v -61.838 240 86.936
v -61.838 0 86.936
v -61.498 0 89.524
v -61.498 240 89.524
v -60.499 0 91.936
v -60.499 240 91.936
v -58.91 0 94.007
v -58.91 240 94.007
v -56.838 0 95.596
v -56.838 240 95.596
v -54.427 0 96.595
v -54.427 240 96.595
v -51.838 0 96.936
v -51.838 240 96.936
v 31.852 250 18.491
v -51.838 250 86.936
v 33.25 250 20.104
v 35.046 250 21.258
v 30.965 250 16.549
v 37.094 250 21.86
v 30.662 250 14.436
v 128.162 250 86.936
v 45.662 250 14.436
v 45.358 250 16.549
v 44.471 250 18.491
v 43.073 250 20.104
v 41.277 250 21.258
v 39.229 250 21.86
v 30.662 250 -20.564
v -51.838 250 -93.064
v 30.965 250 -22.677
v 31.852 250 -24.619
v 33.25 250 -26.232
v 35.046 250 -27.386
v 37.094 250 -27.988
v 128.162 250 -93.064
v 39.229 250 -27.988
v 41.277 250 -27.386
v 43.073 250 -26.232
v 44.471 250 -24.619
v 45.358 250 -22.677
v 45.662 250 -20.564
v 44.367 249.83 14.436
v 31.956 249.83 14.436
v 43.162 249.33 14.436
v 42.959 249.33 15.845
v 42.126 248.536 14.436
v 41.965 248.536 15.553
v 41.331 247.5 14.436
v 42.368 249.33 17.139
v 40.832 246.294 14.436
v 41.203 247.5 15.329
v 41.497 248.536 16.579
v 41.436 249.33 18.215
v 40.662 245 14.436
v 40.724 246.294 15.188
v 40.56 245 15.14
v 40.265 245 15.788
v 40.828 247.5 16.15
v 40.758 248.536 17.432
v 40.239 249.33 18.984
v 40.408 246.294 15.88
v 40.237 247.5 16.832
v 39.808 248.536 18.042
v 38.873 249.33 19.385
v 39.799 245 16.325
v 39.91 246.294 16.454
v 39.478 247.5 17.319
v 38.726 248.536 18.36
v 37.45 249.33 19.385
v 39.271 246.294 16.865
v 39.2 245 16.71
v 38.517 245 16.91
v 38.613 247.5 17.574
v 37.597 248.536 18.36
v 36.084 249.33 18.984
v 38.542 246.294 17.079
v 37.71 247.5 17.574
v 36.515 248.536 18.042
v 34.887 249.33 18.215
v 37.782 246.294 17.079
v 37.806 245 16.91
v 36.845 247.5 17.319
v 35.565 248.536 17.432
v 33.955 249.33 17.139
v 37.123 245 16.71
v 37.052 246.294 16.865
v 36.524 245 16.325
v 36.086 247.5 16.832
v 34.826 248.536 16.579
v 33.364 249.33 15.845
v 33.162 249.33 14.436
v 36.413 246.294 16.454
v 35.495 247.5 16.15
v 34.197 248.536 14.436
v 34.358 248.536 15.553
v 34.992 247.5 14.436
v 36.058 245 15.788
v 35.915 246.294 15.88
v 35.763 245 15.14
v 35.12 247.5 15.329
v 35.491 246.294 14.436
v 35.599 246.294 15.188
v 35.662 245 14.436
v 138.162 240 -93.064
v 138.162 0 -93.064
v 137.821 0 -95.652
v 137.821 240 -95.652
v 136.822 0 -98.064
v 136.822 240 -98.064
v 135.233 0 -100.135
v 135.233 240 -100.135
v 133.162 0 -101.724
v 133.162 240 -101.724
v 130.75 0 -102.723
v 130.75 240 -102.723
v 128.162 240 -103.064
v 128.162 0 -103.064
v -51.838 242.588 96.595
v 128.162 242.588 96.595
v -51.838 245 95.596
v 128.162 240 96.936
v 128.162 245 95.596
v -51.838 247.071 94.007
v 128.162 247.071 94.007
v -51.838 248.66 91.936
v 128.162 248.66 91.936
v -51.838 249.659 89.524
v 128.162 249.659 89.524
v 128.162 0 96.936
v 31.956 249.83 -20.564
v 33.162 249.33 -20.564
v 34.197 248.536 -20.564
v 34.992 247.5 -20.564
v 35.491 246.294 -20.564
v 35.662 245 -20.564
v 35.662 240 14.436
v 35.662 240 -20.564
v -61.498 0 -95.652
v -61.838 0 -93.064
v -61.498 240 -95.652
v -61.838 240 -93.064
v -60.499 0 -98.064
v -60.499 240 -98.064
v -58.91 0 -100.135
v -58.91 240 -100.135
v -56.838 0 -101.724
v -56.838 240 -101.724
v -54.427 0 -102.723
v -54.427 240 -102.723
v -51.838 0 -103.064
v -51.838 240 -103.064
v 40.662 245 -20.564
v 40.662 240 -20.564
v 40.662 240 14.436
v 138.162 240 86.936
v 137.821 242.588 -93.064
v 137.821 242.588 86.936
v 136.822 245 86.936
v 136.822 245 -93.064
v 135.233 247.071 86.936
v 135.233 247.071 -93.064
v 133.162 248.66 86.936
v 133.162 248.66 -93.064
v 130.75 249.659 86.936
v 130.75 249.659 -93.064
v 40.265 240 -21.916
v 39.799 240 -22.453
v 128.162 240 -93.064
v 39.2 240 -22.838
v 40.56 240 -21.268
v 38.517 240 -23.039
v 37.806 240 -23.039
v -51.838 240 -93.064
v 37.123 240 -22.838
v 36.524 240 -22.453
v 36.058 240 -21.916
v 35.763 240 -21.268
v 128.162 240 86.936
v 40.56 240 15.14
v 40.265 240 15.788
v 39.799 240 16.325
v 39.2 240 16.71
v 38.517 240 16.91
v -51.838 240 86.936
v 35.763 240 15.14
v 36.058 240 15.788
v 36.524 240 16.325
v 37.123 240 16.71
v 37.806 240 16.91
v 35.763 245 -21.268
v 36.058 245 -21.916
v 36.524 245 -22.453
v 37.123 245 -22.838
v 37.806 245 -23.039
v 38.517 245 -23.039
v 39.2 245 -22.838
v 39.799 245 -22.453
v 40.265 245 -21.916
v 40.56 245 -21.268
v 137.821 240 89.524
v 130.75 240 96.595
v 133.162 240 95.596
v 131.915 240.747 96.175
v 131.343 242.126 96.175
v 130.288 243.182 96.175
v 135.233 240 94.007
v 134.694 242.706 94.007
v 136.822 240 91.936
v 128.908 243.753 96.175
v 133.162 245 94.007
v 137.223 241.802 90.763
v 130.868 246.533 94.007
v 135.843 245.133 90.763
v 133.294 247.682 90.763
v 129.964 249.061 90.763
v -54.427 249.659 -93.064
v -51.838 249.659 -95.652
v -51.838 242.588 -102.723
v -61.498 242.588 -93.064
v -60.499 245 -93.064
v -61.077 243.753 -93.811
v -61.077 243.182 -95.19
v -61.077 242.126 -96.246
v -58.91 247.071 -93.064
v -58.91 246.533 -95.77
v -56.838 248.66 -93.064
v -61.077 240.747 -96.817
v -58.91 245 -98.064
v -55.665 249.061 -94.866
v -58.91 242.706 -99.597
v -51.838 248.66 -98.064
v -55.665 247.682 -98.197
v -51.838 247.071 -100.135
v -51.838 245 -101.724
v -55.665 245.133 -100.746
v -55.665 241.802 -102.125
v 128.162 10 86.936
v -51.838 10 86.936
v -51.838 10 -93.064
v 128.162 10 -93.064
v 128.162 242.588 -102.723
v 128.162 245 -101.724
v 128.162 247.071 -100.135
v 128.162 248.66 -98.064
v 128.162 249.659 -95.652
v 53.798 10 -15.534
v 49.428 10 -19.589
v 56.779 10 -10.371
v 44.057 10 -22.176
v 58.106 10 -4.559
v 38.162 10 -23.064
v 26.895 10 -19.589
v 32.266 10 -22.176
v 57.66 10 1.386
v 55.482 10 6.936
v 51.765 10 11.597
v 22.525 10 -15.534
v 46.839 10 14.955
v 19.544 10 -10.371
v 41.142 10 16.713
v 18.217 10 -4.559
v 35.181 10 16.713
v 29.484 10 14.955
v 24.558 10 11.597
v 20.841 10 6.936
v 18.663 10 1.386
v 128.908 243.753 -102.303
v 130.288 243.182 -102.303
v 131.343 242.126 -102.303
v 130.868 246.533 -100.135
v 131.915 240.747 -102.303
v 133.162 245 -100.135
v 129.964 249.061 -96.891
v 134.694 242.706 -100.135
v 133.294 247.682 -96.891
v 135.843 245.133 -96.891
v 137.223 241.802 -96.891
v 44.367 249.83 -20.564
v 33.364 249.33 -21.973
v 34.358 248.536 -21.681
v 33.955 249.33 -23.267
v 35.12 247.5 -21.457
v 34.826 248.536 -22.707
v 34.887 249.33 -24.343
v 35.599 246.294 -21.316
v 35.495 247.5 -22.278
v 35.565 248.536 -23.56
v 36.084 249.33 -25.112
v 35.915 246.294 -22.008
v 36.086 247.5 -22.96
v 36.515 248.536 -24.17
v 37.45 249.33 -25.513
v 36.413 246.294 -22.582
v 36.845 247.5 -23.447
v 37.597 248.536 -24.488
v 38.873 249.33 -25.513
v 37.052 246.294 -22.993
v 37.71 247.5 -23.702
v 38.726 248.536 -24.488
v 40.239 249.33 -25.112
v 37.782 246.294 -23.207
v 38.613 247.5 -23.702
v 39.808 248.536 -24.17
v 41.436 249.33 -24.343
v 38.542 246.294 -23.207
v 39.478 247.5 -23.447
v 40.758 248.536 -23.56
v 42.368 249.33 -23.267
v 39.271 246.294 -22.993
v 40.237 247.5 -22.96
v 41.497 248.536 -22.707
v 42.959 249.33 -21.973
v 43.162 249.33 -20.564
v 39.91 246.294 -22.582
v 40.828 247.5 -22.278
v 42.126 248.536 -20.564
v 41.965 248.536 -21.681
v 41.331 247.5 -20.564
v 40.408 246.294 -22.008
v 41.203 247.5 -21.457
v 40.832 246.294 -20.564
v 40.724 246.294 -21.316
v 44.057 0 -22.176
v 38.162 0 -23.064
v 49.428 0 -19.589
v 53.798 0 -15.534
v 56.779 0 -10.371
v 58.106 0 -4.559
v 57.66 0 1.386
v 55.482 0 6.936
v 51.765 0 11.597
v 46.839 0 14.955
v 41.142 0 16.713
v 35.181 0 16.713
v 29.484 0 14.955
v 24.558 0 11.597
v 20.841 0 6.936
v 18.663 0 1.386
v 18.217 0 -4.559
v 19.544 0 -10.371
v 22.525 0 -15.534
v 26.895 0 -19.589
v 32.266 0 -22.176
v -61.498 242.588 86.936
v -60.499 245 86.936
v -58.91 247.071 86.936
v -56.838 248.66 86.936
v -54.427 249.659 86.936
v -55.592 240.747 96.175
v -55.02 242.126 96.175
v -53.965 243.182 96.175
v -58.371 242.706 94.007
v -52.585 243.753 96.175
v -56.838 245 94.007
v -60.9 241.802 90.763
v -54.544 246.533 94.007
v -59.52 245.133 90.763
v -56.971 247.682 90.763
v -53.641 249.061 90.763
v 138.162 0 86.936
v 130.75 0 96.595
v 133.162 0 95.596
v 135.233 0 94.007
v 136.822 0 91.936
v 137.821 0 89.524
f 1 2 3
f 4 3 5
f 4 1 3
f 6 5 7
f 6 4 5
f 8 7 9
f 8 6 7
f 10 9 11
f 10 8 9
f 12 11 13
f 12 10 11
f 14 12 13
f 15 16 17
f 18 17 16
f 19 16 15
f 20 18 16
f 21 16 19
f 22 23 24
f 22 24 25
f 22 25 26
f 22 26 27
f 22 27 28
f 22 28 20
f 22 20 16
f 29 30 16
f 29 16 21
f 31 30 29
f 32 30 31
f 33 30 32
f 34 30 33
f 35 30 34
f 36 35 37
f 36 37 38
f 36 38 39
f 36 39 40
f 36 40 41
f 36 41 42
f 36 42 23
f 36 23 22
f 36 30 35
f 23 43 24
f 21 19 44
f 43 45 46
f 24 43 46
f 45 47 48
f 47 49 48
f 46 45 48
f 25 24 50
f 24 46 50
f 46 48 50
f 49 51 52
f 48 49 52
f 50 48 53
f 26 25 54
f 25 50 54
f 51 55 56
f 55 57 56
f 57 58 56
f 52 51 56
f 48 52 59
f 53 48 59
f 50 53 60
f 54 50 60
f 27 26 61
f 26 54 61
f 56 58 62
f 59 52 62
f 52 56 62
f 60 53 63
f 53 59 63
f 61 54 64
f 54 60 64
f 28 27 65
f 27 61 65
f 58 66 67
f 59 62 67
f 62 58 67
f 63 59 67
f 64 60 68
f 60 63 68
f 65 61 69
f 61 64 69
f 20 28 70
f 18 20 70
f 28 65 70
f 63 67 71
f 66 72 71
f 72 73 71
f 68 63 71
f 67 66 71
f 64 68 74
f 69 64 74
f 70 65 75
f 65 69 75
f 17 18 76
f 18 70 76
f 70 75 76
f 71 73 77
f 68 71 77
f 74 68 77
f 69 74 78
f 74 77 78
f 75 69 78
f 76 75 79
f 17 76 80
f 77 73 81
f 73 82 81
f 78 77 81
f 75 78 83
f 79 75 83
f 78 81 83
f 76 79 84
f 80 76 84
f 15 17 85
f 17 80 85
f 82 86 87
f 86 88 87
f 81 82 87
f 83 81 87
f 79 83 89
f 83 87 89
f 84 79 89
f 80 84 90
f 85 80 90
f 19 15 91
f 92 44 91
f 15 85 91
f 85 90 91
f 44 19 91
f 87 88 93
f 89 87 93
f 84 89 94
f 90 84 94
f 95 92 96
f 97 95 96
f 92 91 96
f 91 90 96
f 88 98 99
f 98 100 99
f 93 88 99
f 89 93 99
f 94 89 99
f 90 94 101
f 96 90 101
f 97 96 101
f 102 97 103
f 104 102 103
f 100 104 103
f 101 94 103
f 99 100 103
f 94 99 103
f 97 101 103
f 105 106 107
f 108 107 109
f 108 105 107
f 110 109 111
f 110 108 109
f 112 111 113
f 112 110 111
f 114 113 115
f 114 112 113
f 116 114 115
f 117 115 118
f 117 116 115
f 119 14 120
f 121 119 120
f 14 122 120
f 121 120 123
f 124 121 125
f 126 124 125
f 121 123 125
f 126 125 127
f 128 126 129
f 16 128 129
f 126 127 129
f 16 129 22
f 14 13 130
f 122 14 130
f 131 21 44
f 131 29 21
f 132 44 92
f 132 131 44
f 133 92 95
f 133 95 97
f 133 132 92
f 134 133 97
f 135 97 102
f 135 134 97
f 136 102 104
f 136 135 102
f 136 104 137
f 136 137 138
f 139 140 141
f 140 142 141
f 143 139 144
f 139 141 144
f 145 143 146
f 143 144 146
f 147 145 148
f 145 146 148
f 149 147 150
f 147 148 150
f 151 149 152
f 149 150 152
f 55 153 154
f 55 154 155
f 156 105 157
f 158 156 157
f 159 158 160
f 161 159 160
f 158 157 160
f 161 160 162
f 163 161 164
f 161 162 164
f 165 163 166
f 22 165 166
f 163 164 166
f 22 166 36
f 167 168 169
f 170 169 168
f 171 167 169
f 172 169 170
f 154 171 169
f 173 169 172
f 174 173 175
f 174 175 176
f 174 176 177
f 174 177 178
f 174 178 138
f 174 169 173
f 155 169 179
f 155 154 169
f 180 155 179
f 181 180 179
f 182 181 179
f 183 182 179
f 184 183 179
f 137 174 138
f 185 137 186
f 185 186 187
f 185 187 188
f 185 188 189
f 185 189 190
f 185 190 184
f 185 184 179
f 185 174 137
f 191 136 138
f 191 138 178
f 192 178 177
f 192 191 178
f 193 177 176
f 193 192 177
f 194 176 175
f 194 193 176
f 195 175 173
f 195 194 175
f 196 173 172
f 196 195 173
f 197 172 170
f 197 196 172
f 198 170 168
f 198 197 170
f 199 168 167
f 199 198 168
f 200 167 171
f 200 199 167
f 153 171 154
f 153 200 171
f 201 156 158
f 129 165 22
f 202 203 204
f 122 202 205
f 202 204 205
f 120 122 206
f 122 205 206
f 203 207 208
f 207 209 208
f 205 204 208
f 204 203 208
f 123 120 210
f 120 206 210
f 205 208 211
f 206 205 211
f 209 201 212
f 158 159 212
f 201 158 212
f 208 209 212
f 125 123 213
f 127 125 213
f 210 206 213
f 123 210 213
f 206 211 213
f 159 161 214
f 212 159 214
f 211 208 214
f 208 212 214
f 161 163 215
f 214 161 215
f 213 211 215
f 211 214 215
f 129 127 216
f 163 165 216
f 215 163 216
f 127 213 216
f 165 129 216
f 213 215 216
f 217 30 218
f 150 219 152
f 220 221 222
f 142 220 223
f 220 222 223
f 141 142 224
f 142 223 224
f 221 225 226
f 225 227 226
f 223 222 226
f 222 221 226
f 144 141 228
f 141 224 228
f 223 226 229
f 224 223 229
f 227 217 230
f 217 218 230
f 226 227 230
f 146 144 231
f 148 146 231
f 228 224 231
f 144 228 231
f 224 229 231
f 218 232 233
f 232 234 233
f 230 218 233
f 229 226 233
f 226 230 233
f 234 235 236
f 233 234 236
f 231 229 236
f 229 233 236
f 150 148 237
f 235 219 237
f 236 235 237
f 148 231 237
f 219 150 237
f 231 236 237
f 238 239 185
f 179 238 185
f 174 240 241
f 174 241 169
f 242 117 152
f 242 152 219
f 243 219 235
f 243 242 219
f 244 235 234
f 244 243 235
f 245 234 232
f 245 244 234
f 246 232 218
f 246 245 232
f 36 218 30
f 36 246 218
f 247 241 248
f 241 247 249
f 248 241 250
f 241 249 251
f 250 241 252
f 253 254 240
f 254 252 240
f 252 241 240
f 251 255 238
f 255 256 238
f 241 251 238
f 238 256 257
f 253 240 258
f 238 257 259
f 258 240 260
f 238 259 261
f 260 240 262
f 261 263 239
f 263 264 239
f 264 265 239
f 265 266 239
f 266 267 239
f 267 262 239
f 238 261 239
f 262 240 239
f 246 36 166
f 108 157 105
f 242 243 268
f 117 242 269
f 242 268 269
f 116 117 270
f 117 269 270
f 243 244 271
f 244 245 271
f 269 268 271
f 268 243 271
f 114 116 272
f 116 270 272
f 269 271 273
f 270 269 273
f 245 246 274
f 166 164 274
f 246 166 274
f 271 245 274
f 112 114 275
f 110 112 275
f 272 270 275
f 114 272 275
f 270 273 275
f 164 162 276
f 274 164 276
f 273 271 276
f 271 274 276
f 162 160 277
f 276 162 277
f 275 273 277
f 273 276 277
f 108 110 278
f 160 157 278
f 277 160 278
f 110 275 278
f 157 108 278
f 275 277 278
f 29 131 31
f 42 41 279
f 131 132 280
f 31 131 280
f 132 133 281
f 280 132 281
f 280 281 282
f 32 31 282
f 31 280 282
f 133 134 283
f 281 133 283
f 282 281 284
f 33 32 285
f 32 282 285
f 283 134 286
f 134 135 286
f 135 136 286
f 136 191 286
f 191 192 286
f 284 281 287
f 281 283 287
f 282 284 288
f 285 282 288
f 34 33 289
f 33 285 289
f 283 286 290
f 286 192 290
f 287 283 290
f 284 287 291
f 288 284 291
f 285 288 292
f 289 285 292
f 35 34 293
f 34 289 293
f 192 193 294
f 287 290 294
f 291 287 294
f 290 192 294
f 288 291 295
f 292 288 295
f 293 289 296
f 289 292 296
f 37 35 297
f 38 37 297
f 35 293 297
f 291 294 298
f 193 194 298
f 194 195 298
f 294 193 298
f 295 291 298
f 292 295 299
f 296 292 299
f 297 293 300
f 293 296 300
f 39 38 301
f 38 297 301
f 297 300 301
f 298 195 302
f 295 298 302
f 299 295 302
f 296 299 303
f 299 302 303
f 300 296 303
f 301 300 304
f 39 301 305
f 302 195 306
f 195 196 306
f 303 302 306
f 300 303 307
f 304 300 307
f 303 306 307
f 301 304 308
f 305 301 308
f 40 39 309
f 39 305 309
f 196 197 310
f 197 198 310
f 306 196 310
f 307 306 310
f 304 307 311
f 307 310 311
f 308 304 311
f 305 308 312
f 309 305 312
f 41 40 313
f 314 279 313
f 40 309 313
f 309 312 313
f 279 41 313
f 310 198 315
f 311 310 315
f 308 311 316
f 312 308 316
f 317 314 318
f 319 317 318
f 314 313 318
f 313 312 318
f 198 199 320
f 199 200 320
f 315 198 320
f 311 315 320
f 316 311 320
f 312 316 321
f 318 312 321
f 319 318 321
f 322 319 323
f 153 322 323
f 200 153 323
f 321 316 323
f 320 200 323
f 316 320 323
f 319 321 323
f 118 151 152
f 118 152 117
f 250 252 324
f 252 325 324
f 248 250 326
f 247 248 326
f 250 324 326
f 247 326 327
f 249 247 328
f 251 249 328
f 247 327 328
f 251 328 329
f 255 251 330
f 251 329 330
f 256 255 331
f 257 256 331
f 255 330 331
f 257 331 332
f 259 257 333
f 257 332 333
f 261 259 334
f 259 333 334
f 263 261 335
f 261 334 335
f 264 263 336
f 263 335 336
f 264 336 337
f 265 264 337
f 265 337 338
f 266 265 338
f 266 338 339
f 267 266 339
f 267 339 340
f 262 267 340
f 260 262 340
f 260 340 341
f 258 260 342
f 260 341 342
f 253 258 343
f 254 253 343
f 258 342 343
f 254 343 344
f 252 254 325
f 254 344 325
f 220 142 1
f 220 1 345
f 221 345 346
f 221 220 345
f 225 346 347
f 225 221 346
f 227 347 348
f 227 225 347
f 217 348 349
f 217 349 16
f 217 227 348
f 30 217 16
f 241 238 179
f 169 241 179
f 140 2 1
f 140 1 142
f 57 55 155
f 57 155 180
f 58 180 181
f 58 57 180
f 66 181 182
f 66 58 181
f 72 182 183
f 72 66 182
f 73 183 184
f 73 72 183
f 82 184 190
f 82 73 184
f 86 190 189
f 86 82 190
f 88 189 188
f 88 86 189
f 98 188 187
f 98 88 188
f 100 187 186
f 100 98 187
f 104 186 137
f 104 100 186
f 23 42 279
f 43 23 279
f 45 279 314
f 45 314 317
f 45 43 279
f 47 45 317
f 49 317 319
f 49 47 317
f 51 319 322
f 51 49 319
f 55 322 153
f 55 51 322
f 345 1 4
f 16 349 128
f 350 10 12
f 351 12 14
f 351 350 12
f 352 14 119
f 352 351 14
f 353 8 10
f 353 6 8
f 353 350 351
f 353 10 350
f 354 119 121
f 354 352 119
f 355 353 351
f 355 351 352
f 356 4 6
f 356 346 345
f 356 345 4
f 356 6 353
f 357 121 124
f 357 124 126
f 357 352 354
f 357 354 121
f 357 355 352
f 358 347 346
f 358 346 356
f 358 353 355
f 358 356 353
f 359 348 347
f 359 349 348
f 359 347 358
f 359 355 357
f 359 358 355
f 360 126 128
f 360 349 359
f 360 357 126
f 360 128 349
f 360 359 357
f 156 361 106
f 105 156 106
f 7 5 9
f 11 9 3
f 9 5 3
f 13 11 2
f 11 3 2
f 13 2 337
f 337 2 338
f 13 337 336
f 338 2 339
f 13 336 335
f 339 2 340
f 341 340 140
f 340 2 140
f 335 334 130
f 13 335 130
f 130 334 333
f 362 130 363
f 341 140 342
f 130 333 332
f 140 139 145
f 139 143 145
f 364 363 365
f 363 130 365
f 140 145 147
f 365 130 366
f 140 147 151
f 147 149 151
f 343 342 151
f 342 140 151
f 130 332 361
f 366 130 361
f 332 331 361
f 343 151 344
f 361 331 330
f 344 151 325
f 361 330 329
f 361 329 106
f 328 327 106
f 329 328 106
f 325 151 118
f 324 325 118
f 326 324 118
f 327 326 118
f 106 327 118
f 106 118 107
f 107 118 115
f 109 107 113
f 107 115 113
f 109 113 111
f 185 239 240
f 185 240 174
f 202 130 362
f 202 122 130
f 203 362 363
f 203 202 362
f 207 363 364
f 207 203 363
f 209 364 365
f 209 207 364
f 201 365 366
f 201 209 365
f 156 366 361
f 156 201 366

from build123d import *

# Parameters (mm, degrees)
SKETCH1_W           = 200
SKETCH1_H           = 200
BOSS_EXTRUDE1_DEPTH = 250
FILLET1_R           = 10
SHELL1_START        = -51.838440111
SHELL1_OUTLINE_W    = 230
SHELL1_OUTLINE_H    = 180
SHELL1_DEPTH        = 180
CUT_EXTRUDE1_REACH  = 305.662
FILLET2_R           = 5
CUT_EXTRUDE2_REACH  = 305.662
SKETCH3_R           = 20


# Read off the part's stored shape, not the designer's step: Shell1
with BuildPart() as part:
    # Sketch1 → Boss-Extrude1 (new body)
    with BuildSketch(Plane(origin=(0, 0, 0), x_dir=(1, 0, 0), z_dir=(0, 1, 0))):
        with Locations((38.161559889, 3.064066852)):
            Rectangle(SKETCH1_W, SKETCH1_H)
    extrude(amount=BOSS_EXTRUDE1_DEPTH)

    # Fillet1
    fillet1_edges = [part.edges().sort_by_distance(p)[0] for p in [
        (138.161559889, 250, -3.064066852),
        (38.161559889, 250, -103.064066852),
        (-61.838440111, 250, -3.064066852),
        (-61.838440111, 125, -103.064066852),
        (138.161559889, 125, -103.064066852),
        (138.161559889, 125, 96.935933148),
        (-61.838440111, 125, 96.935933148),
        (38.161559889, 250, 96.935933148),
    ]]
    fillet(fillet1_edges, radius=FILLET1_R)

    # Shell1 outline → Shell1 (cut)
    with BuildSketch(Plane.YZ.offset(SHELL1_START)):
        with Locations((125, -3.064066852)):
            Rectangle(SHELL1_OUTLINE_W, SHELL1_OUTLINE_H)
    extrude(amount=SHELL1_DEPTH, mode=Mode.SUBTRACT)

    # Sketch2 → Cut-Extrude1 (cut, up to next)
    with BuildSketch(Plane(origin=(0, 250, 0), x_dir=(1, 0, 0), z_dir=(0, 1, 0)), mode=Mode.PRIVATE) as cut_extrude1_sk1:
        with BuildLine():
            Line((40.661559889, 20.564066852), (40.661559889, -14.435933148))
            ThreePointArc((40.661559889, -14.435933148), (38.161559889, -16.935933148), (35.661559889, -14.435933148))
            Line((35.661559889, -14.435933148), (35.661559889, 20.564066852))
            ThreePointArc((35.661559889, 20.564066852), (38.161559889, 23.064066852), (40.661559889, 20.564066852))
        make_face()
    cut_extrude1_tool1 = extrude(cut_extrude1_sk1.sketch, amount=-CUT_EXTRUDE1_REACH, mode=Mode.PRIVATE) & part.part
    add(cut_extrude1_tool1.solids().sort_by_distance((38.16156, 250, -3.064067))[0], mode=Mode.SUBTRACT)

    # Fillet2
    fillet2_edges = [part.edges().sort_by_distance(p)[0] for p in [
        (38.161559889, 250, -23.064066852),
        (35.661559889, 250, -3.064066852),
        (38.161559889, 250, 16.935933148),
        (40.661559889, 250, -3.064066852),
    ]]
    fillet(fillet2_edges, radius=FILLET2_R)

    # Sketch3 → Cut-Extrude2 (cut, up to next)
    with BuildSketch(Plane(origin=(0, 0, 0), x_dir=(-1, 0, 0), z_dir=(0, -1, 0)), mode=Mode.PRIVATE) as cut_extrude2_sk1:
        with Locations(Location((-38.161559889, 3.064066852, 0), (0, 0, 90))):
            Circle(SKETCH3_R)
    cut_extrude2_tool1 = extrude(cut_extrude2_sk1.sketch, amount=-CUT_EXTRUDE2_REACH, mode=Mode.PRIVATE) & part.part
    add(cut_extrude2_tool1.solids().sort_by_distance((38.16156, 0, -3.064067))[0], mode=Mode.SUBTRACT)


solid = part.part
